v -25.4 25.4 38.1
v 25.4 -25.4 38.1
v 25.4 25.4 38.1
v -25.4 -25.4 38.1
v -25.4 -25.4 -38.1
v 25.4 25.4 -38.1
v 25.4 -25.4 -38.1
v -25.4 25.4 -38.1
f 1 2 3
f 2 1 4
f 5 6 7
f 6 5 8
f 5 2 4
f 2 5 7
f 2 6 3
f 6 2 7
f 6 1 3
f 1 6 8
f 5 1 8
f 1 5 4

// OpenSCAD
// ========================================
// a 2 by 2 by 3 inch box
// NeuroCAD canonical IR; dimensions are millimetres
// ========================================
$fn = 48;

cube(size=[50.8, 50.8, 76.2], center=true);
